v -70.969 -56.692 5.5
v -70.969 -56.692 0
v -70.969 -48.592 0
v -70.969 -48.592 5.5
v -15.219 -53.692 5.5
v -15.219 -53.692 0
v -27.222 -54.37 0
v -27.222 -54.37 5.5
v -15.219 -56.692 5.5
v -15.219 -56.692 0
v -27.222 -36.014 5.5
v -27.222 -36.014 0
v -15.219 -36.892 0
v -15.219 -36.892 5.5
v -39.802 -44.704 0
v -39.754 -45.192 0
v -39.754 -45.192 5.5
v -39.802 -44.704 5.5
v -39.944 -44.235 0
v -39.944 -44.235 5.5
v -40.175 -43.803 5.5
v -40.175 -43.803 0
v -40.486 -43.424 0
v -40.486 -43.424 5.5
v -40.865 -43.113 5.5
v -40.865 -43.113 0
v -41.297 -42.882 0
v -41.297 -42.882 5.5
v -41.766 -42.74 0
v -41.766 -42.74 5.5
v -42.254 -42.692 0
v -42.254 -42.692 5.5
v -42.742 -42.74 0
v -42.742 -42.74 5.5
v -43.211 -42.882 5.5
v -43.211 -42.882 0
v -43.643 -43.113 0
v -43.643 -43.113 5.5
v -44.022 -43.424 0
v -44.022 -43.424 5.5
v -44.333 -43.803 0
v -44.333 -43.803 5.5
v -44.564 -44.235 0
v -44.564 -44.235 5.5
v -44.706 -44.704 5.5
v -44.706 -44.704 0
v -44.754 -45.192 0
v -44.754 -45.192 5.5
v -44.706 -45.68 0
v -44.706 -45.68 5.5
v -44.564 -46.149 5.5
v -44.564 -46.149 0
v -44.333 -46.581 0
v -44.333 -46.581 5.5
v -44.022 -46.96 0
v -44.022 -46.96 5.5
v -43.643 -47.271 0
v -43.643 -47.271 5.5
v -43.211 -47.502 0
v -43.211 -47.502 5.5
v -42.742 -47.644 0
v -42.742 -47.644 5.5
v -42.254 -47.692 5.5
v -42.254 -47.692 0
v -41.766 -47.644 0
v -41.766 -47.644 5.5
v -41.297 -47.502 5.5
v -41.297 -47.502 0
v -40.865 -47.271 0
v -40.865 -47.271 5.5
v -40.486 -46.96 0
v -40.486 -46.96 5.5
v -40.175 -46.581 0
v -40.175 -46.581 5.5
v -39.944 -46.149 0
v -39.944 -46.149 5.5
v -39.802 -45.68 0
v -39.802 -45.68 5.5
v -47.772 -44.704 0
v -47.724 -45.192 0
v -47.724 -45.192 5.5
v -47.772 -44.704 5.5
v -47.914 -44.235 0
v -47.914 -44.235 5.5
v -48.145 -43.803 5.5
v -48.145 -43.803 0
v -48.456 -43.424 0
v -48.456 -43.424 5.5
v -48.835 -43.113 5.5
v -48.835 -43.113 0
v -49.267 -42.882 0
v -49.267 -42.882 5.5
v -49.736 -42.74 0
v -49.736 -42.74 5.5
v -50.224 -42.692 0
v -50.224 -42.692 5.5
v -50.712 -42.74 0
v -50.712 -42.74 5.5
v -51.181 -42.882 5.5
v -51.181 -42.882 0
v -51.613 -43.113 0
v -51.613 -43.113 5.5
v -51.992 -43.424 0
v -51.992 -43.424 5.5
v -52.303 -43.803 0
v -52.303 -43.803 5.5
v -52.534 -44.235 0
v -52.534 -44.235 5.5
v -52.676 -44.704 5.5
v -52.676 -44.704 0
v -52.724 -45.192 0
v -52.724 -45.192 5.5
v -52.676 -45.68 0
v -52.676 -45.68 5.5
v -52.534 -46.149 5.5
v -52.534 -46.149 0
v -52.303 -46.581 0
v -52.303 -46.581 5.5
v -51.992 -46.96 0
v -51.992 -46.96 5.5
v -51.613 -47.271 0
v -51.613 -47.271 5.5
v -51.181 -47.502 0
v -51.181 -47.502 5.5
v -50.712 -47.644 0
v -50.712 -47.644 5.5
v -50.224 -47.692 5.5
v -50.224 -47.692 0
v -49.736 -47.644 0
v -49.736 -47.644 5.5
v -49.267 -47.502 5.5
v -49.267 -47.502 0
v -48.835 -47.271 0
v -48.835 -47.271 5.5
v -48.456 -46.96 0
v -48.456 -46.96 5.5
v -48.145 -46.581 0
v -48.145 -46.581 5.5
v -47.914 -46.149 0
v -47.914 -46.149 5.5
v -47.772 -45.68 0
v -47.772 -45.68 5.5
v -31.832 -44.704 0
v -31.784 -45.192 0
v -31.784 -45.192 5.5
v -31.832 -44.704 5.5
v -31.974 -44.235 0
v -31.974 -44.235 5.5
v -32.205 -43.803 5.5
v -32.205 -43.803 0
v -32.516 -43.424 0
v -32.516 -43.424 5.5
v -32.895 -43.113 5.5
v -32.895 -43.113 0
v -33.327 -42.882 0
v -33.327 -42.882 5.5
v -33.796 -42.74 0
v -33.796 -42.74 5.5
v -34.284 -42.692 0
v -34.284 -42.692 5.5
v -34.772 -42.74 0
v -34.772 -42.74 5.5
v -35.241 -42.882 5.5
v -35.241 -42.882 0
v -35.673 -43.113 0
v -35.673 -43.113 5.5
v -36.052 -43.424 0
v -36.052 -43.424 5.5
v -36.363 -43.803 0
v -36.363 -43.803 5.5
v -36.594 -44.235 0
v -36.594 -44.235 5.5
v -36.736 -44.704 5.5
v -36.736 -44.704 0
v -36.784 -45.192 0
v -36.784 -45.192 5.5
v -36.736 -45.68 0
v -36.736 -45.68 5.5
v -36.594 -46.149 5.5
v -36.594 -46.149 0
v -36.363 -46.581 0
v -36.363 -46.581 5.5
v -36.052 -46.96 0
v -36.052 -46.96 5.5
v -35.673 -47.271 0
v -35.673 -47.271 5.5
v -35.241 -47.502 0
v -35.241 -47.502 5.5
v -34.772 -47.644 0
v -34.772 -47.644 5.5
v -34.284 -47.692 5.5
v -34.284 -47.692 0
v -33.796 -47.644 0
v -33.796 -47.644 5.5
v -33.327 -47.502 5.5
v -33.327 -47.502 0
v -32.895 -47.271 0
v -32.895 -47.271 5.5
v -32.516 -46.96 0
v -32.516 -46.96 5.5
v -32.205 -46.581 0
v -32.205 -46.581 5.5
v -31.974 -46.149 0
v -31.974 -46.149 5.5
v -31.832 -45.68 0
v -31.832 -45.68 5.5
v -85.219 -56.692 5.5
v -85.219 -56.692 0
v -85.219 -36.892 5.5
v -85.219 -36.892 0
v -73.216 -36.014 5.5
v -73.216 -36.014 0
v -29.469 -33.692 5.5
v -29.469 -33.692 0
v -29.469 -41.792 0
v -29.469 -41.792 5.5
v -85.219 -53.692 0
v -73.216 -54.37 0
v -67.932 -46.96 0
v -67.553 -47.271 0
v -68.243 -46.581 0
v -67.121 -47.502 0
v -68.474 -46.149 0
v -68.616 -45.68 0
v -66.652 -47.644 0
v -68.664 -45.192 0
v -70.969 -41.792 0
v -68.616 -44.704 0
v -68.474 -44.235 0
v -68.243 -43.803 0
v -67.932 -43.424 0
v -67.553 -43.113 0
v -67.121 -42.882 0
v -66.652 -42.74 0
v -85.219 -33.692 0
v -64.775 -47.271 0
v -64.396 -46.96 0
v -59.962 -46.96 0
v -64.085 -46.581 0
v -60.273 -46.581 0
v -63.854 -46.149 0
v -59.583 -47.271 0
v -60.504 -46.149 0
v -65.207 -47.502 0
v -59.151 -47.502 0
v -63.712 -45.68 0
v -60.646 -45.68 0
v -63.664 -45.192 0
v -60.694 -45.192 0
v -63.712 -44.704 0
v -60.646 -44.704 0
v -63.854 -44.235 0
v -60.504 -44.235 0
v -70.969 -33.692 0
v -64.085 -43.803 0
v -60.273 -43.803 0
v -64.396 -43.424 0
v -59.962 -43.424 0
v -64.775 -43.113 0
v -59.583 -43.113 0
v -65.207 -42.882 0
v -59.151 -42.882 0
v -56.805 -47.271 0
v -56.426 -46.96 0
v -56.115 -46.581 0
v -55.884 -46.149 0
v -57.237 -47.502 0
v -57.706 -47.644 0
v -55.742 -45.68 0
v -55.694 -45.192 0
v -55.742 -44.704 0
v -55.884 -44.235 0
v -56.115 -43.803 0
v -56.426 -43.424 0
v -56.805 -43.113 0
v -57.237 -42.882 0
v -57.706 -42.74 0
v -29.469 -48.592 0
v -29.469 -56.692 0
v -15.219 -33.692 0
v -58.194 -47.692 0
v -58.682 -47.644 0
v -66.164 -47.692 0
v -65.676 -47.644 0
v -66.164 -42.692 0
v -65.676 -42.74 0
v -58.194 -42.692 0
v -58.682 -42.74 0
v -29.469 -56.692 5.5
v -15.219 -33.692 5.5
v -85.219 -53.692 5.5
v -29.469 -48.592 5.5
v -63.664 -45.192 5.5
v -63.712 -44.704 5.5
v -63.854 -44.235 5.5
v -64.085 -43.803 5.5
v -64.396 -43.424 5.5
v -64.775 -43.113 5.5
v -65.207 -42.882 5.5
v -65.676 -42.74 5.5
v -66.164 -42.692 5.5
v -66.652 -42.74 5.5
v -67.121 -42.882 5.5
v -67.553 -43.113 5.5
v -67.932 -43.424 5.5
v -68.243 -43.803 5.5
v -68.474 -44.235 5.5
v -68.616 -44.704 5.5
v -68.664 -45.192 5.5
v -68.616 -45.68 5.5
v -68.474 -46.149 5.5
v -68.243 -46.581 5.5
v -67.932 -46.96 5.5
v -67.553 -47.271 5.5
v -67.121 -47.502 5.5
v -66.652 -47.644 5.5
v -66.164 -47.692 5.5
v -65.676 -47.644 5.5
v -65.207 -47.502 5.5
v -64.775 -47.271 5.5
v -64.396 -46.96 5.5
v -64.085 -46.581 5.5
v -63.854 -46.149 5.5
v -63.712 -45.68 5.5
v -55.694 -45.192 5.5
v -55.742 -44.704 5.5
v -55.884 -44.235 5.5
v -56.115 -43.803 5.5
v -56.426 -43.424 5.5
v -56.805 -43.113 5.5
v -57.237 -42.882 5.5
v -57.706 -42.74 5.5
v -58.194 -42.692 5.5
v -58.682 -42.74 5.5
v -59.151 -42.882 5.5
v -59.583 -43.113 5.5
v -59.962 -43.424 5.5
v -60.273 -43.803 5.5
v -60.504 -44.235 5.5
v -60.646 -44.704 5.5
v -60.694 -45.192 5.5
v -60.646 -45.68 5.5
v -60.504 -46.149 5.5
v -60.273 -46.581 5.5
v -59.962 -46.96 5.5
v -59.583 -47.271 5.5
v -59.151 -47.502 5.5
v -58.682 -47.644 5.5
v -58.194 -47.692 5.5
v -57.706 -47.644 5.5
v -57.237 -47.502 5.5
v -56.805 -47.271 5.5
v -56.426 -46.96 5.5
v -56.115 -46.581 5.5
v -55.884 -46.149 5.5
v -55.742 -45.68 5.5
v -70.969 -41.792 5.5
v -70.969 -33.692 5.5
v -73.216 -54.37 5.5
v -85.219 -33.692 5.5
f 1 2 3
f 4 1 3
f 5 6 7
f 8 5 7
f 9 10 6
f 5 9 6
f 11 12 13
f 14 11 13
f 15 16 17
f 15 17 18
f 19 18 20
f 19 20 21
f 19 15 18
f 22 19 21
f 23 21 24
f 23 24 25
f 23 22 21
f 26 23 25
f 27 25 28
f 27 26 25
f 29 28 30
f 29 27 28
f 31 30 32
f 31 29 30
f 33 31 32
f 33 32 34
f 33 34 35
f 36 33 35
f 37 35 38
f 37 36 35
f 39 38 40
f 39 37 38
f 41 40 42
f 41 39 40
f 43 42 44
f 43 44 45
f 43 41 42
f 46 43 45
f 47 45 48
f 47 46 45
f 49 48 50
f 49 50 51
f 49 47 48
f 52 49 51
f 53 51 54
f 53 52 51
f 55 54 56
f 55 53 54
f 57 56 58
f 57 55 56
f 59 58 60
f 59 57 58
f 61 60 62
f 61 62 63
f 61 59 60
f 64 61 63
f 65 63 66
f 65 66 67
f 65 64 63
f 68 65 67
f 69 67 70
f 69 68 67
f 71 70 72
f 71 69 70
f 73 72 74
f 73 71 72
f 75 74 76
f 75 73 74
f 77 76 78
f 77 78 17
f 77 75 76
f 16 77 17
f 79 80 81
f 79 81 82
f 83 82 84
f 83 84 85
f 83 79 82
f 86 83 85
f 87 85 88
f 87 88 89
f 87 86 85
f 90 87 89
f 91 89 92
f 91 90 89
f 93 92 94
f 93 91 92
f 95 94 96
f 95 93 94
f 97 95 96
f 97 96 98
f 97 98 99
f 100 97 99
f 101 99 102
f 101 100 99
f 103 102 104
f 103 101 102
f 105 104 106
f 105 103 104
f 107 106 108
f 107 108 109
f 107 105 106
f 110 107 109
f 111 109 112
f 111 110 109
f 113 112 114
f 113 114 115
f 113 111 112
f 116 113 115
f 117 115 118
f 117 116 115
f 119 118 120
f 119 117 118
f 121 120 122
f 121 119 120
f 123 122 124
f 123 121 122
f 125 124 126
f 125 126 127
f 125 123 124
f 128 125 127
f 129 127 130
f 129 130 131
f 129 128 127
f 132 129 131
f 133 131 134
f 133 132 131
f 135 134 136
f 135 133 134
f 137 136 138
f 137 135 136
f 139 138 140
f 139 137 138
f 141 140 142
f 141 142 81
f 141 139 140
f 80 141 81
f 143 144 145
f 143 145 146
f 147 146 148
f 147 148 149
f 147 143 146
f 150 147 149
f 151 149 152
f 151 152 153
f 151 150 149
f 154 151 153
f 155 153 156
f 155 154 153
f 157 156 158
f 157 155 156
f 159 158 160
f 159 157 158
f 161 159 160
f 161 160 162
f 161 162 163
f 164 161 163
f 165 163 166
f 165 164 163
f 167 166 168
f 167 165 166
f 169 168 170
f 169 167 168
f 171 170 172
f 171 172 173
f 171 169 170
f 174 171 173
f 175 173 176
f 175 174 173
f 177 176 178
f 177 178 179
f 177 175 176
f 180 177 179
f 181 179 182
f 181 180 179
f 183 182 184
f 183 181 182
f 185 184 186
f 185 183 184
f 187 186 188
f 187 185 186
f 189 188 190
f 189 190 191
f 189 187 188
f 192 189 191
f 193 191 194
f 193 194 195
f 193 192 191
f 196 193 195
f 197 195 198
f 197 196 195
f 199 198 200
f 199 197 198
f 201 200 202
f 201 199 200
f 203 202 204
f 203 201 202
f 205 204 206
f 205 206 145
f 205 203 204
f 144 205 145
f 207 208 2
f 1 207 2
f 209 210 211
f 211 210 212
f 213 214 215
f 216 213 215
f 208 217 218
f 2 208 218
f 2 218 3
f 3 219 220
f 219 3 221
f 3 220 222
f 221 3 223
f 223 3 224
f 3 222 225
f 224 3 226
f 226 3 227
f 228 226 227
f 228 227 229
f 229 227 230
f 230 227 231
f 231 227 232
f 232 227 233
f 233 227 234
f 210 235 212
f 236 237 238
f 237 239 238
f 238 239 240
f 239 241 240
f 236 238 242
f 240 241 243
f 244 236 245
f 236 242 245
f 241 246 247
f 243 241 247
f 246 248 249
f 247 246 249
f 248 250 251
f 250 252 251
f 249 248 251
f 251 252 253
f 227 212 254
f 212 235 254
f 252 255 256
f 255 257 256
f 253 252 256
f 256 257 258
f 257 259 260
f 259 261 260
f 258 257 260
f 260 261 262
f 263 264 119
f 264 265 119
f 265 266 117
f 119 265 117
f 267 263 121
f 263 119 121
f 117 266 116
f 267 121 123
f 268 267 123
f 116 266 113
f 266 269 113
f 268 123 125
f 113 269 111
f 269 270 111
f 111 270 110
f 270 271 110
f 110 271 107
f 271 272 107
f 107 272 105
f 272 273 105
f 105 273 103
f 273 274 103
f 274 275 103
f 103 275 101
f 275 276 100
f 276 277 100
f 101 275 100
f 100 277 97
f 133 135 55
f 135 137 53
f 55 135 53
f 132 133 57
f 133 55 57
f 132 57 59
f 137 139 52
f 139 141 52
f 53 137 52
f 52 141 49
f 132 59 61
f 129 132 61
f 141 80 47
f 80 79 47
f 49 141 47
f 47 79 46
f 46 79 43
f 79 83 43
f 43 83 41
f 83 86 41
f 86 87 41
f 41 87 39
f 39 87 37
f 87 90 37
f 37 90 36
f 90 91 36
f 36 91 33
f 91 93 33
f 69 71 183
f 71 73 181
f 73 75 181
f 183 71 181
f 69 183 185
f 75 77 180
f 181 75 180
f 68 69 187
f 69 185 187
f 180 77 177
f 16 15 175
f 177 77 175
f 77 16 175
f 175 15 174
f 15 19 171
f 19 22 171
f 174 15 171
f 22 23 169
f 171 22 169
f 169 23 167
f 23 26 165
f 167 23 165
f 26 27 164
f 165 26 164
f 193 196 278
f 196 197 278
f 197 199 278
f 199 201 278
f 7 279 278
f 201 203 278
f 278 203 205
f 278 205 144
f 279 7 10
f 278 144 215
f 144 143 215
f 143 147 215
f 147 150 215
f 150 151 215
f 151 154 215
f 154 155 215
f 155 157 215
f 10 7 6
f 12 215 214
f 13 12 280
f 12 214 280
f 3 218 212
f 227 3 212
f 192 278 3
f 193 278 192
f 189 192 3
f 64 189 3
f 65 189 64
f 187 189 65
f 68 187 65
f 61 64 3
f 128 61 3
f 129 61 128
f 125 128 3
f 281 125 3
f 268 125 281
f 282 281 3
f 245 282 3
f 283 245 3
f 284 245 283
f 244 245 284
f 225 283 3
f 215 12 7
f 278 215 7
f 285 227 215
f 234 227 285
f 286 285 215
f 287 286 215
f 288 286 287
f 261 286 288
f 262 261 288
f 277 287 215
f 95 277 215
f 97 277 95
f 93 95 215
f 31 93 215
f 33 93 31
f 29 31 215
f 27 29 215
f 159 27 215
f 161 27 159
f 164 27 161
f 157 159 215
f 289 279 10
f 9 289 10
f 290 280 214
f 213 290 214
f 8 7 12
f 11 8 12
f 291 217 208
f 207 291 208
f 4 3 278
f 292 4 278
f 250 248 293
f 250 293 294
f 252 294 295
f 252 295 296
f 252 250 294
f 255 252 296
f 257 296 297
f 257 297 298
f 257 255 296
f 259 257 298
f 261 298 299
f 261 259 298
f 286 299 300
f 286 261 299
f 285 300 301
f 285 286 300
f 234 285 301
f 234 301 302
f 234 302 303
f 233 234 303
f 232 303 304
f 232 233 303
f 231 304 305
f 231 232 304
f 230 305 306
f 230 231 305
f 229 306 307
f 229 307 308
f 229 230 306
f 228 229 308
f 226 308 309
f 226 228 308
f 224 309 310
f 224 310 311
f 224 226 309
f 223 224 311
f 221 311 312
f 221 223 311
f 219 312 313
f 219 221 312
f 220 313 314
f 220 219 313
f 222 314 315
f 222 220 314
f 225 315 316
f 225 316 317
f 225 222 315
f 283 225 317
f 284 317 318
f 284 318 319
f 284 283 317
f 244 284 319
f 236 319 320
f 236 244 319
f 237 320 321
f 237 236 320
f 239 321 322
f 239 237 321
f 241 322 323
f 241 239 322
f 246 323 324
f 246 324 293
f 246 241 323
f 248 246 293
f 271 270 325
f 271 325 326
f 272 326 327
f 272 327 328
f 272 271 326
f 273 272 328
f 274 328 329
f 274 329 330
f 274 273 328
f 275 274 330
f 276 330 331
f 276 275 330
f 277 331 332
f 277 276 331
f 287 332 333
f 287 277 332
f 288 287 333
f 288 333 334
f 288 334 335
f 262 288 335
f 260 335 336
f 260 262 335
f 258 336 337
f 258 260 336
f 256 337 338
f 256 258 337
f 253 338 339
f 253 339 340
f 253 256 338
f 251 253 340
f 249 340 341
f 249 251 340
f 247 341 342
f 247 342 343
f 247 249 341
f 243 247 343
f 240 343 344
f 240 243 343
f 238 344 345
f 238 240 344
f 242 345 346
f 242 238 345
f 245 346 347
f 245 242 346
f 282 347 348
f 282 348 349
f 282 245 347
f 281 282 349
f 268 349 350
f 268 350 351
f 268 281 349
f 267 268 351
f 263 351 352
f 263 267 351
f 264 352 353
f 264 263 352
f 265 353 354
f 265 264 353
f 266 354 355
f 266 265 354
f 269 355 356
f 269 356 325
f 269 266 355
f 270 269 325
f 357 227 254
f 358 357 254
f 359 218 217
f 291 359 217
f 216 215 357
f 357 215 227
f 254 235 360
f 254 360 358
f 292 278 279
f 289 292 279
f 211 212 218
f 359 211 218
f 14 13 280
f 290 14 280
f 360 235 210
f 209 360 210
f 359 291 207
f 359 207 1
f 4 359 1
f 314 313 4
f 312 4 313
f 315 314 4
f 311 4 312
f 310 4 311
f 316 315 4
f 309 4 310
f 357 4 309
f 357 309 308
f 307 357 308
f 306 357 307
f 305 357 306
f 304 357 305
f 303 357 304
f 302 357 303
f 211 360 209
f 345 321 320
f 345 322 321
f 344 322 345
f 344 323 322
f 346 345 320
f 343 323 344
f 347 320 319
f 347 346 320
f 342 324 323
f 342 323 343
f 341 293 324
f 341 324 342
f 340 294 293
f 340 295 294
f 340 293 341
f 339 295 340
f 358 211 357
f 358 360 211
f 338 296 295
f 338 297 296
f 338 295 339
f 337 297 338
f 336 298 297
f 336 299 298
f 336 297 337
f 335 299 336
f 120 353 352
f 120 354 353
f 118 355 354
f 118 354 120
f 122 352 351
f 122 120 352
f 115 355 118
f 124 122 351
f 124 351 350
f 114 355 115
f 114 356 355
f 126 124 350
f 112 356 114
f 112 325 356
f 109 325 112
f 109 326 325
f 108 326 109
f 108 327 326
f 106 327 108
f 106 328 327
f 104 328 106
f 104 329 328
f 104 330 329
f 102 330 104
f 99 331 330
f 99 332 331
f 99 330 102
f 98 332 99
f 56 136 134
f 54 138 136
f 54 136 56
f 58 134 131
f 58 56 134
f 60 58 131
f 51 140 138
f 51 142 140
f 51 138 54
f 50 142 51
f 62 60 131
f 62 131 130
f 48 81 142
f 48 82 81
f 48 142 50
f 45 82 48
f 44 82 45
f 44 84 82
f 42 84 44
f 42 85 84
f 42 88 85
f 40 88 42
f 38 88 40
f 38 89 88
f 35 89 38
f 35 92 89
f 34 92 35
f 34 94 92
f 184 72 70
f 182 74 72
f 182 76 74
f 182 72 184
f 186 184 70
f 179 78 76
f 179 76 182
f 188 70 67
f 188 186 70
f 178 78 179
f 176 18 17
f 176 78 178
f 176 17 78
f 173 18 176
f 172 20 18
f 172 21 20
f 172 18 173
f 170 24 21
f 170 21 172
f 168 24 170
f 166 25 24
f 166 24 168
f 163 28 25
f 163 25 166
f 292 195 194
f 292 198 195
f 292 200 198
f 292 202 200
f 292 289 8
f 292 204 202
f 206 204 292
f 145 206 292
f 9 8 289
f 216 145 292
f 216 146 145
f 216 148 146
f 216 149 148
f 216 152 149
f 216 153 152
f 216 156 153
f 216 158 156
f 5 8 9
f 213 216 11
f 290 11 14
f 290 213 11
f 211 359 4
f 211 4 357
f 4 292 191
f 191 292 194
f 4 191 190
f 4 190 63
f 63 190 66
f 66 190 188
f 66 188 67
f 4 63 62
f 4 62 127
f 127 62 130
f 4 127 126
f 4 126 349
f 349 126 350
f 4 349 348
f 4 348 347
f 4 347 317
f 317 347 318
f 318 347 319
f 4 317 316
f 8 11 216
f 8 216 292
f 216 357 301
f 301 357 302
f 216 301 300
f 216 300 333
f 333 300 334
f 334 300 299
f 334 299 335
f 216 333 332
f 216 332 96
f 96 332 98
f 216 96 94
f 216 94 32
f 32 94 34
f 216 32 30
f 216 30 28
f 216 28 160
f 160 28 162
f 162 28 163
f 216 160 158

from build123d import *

# Parameters (mm, degrees)
SKETCH_1_R      = 2.5
SKETCH_1_W      = 14.25
SKETCH_1_H      = 1.5
EXTRUDE_2_DEPTH = 5.5


with BuildPart() as part:
    # 草圖1 → 填料-伸長2 (new body)
    with BuildSketch(Plane.XY):
        Polygon((-70.969139755, -35.192052365), (-85.219139755, -35.192052365), (-85.219139755, -35.633297351), (-85.219139755, -36.892052365), (-73.216342126, -36.014419398), (-73.216342126, -54.369685333), (-85.219139755, -53.692052365), (-85.219139755, -54.75080738), (-85.219139755, -55.192052365), (-85.219139755, -56.692052365), (-70.969139755, -56.692052365), (-70.969139755, -55.192052365), (-70.969139755, -48.592052365), (-66.164139755, -48.592052365), (-29.469139755, -48.592052365), (-29.469139755, -55.192052365), (-29.469139755, -56.692052365), (-15.219139755, -56.692052365), (-15.219139755, -55.192052365), (-15.219139755, -54.75080738), (-15.219139755, -53.692052365), (-27.221937385, -54.369685333), (-27.221937385, -36.014419398), (-15.219139755, -36.892052365), (-15.219139755, -35.633297351), (-15.219139755, -35.192052365), (-15.219139755, -33.692052365), (-29.469139755, -33.692052365), (-29.469139755, -35.192052365), (-29.469139755, -41.792052365), (-66.164139755, -41.792052365), (-70.969139755, -41.792052365), align=None)
        with Locations((-66.164139755, -45.192052365)):
            Circle(SKETCH_1_R, mode=Mode.SUBTRACT)
        with Locations((-58.194139755, -45.192052365)):
            Circle(SKETCH_1_R, mode=Mode.SUBTRACT)
        with Locations((-50.224139755, -45.192052365)):
            Circle(SKETCH_1_R, mode=Mode.SUBTRACT)
        with Locations((-42.254139755, -45.192052365)):
            Circle(SKETCH_1_R, mode=Mode.SUBTRACT)
        with Locations((-34.284139755, -45.192052365)):
            Circle(SKETCH_1_R, mode=Mode.SUBTRACT)
        with Locations((-78.094139755, -34.442052365)):
            Rectangle(SKETCH_1_W, SKETCH_1_H)
    extrude(amount=EXTRUDE_2_DEPTH)


solid = part.part
